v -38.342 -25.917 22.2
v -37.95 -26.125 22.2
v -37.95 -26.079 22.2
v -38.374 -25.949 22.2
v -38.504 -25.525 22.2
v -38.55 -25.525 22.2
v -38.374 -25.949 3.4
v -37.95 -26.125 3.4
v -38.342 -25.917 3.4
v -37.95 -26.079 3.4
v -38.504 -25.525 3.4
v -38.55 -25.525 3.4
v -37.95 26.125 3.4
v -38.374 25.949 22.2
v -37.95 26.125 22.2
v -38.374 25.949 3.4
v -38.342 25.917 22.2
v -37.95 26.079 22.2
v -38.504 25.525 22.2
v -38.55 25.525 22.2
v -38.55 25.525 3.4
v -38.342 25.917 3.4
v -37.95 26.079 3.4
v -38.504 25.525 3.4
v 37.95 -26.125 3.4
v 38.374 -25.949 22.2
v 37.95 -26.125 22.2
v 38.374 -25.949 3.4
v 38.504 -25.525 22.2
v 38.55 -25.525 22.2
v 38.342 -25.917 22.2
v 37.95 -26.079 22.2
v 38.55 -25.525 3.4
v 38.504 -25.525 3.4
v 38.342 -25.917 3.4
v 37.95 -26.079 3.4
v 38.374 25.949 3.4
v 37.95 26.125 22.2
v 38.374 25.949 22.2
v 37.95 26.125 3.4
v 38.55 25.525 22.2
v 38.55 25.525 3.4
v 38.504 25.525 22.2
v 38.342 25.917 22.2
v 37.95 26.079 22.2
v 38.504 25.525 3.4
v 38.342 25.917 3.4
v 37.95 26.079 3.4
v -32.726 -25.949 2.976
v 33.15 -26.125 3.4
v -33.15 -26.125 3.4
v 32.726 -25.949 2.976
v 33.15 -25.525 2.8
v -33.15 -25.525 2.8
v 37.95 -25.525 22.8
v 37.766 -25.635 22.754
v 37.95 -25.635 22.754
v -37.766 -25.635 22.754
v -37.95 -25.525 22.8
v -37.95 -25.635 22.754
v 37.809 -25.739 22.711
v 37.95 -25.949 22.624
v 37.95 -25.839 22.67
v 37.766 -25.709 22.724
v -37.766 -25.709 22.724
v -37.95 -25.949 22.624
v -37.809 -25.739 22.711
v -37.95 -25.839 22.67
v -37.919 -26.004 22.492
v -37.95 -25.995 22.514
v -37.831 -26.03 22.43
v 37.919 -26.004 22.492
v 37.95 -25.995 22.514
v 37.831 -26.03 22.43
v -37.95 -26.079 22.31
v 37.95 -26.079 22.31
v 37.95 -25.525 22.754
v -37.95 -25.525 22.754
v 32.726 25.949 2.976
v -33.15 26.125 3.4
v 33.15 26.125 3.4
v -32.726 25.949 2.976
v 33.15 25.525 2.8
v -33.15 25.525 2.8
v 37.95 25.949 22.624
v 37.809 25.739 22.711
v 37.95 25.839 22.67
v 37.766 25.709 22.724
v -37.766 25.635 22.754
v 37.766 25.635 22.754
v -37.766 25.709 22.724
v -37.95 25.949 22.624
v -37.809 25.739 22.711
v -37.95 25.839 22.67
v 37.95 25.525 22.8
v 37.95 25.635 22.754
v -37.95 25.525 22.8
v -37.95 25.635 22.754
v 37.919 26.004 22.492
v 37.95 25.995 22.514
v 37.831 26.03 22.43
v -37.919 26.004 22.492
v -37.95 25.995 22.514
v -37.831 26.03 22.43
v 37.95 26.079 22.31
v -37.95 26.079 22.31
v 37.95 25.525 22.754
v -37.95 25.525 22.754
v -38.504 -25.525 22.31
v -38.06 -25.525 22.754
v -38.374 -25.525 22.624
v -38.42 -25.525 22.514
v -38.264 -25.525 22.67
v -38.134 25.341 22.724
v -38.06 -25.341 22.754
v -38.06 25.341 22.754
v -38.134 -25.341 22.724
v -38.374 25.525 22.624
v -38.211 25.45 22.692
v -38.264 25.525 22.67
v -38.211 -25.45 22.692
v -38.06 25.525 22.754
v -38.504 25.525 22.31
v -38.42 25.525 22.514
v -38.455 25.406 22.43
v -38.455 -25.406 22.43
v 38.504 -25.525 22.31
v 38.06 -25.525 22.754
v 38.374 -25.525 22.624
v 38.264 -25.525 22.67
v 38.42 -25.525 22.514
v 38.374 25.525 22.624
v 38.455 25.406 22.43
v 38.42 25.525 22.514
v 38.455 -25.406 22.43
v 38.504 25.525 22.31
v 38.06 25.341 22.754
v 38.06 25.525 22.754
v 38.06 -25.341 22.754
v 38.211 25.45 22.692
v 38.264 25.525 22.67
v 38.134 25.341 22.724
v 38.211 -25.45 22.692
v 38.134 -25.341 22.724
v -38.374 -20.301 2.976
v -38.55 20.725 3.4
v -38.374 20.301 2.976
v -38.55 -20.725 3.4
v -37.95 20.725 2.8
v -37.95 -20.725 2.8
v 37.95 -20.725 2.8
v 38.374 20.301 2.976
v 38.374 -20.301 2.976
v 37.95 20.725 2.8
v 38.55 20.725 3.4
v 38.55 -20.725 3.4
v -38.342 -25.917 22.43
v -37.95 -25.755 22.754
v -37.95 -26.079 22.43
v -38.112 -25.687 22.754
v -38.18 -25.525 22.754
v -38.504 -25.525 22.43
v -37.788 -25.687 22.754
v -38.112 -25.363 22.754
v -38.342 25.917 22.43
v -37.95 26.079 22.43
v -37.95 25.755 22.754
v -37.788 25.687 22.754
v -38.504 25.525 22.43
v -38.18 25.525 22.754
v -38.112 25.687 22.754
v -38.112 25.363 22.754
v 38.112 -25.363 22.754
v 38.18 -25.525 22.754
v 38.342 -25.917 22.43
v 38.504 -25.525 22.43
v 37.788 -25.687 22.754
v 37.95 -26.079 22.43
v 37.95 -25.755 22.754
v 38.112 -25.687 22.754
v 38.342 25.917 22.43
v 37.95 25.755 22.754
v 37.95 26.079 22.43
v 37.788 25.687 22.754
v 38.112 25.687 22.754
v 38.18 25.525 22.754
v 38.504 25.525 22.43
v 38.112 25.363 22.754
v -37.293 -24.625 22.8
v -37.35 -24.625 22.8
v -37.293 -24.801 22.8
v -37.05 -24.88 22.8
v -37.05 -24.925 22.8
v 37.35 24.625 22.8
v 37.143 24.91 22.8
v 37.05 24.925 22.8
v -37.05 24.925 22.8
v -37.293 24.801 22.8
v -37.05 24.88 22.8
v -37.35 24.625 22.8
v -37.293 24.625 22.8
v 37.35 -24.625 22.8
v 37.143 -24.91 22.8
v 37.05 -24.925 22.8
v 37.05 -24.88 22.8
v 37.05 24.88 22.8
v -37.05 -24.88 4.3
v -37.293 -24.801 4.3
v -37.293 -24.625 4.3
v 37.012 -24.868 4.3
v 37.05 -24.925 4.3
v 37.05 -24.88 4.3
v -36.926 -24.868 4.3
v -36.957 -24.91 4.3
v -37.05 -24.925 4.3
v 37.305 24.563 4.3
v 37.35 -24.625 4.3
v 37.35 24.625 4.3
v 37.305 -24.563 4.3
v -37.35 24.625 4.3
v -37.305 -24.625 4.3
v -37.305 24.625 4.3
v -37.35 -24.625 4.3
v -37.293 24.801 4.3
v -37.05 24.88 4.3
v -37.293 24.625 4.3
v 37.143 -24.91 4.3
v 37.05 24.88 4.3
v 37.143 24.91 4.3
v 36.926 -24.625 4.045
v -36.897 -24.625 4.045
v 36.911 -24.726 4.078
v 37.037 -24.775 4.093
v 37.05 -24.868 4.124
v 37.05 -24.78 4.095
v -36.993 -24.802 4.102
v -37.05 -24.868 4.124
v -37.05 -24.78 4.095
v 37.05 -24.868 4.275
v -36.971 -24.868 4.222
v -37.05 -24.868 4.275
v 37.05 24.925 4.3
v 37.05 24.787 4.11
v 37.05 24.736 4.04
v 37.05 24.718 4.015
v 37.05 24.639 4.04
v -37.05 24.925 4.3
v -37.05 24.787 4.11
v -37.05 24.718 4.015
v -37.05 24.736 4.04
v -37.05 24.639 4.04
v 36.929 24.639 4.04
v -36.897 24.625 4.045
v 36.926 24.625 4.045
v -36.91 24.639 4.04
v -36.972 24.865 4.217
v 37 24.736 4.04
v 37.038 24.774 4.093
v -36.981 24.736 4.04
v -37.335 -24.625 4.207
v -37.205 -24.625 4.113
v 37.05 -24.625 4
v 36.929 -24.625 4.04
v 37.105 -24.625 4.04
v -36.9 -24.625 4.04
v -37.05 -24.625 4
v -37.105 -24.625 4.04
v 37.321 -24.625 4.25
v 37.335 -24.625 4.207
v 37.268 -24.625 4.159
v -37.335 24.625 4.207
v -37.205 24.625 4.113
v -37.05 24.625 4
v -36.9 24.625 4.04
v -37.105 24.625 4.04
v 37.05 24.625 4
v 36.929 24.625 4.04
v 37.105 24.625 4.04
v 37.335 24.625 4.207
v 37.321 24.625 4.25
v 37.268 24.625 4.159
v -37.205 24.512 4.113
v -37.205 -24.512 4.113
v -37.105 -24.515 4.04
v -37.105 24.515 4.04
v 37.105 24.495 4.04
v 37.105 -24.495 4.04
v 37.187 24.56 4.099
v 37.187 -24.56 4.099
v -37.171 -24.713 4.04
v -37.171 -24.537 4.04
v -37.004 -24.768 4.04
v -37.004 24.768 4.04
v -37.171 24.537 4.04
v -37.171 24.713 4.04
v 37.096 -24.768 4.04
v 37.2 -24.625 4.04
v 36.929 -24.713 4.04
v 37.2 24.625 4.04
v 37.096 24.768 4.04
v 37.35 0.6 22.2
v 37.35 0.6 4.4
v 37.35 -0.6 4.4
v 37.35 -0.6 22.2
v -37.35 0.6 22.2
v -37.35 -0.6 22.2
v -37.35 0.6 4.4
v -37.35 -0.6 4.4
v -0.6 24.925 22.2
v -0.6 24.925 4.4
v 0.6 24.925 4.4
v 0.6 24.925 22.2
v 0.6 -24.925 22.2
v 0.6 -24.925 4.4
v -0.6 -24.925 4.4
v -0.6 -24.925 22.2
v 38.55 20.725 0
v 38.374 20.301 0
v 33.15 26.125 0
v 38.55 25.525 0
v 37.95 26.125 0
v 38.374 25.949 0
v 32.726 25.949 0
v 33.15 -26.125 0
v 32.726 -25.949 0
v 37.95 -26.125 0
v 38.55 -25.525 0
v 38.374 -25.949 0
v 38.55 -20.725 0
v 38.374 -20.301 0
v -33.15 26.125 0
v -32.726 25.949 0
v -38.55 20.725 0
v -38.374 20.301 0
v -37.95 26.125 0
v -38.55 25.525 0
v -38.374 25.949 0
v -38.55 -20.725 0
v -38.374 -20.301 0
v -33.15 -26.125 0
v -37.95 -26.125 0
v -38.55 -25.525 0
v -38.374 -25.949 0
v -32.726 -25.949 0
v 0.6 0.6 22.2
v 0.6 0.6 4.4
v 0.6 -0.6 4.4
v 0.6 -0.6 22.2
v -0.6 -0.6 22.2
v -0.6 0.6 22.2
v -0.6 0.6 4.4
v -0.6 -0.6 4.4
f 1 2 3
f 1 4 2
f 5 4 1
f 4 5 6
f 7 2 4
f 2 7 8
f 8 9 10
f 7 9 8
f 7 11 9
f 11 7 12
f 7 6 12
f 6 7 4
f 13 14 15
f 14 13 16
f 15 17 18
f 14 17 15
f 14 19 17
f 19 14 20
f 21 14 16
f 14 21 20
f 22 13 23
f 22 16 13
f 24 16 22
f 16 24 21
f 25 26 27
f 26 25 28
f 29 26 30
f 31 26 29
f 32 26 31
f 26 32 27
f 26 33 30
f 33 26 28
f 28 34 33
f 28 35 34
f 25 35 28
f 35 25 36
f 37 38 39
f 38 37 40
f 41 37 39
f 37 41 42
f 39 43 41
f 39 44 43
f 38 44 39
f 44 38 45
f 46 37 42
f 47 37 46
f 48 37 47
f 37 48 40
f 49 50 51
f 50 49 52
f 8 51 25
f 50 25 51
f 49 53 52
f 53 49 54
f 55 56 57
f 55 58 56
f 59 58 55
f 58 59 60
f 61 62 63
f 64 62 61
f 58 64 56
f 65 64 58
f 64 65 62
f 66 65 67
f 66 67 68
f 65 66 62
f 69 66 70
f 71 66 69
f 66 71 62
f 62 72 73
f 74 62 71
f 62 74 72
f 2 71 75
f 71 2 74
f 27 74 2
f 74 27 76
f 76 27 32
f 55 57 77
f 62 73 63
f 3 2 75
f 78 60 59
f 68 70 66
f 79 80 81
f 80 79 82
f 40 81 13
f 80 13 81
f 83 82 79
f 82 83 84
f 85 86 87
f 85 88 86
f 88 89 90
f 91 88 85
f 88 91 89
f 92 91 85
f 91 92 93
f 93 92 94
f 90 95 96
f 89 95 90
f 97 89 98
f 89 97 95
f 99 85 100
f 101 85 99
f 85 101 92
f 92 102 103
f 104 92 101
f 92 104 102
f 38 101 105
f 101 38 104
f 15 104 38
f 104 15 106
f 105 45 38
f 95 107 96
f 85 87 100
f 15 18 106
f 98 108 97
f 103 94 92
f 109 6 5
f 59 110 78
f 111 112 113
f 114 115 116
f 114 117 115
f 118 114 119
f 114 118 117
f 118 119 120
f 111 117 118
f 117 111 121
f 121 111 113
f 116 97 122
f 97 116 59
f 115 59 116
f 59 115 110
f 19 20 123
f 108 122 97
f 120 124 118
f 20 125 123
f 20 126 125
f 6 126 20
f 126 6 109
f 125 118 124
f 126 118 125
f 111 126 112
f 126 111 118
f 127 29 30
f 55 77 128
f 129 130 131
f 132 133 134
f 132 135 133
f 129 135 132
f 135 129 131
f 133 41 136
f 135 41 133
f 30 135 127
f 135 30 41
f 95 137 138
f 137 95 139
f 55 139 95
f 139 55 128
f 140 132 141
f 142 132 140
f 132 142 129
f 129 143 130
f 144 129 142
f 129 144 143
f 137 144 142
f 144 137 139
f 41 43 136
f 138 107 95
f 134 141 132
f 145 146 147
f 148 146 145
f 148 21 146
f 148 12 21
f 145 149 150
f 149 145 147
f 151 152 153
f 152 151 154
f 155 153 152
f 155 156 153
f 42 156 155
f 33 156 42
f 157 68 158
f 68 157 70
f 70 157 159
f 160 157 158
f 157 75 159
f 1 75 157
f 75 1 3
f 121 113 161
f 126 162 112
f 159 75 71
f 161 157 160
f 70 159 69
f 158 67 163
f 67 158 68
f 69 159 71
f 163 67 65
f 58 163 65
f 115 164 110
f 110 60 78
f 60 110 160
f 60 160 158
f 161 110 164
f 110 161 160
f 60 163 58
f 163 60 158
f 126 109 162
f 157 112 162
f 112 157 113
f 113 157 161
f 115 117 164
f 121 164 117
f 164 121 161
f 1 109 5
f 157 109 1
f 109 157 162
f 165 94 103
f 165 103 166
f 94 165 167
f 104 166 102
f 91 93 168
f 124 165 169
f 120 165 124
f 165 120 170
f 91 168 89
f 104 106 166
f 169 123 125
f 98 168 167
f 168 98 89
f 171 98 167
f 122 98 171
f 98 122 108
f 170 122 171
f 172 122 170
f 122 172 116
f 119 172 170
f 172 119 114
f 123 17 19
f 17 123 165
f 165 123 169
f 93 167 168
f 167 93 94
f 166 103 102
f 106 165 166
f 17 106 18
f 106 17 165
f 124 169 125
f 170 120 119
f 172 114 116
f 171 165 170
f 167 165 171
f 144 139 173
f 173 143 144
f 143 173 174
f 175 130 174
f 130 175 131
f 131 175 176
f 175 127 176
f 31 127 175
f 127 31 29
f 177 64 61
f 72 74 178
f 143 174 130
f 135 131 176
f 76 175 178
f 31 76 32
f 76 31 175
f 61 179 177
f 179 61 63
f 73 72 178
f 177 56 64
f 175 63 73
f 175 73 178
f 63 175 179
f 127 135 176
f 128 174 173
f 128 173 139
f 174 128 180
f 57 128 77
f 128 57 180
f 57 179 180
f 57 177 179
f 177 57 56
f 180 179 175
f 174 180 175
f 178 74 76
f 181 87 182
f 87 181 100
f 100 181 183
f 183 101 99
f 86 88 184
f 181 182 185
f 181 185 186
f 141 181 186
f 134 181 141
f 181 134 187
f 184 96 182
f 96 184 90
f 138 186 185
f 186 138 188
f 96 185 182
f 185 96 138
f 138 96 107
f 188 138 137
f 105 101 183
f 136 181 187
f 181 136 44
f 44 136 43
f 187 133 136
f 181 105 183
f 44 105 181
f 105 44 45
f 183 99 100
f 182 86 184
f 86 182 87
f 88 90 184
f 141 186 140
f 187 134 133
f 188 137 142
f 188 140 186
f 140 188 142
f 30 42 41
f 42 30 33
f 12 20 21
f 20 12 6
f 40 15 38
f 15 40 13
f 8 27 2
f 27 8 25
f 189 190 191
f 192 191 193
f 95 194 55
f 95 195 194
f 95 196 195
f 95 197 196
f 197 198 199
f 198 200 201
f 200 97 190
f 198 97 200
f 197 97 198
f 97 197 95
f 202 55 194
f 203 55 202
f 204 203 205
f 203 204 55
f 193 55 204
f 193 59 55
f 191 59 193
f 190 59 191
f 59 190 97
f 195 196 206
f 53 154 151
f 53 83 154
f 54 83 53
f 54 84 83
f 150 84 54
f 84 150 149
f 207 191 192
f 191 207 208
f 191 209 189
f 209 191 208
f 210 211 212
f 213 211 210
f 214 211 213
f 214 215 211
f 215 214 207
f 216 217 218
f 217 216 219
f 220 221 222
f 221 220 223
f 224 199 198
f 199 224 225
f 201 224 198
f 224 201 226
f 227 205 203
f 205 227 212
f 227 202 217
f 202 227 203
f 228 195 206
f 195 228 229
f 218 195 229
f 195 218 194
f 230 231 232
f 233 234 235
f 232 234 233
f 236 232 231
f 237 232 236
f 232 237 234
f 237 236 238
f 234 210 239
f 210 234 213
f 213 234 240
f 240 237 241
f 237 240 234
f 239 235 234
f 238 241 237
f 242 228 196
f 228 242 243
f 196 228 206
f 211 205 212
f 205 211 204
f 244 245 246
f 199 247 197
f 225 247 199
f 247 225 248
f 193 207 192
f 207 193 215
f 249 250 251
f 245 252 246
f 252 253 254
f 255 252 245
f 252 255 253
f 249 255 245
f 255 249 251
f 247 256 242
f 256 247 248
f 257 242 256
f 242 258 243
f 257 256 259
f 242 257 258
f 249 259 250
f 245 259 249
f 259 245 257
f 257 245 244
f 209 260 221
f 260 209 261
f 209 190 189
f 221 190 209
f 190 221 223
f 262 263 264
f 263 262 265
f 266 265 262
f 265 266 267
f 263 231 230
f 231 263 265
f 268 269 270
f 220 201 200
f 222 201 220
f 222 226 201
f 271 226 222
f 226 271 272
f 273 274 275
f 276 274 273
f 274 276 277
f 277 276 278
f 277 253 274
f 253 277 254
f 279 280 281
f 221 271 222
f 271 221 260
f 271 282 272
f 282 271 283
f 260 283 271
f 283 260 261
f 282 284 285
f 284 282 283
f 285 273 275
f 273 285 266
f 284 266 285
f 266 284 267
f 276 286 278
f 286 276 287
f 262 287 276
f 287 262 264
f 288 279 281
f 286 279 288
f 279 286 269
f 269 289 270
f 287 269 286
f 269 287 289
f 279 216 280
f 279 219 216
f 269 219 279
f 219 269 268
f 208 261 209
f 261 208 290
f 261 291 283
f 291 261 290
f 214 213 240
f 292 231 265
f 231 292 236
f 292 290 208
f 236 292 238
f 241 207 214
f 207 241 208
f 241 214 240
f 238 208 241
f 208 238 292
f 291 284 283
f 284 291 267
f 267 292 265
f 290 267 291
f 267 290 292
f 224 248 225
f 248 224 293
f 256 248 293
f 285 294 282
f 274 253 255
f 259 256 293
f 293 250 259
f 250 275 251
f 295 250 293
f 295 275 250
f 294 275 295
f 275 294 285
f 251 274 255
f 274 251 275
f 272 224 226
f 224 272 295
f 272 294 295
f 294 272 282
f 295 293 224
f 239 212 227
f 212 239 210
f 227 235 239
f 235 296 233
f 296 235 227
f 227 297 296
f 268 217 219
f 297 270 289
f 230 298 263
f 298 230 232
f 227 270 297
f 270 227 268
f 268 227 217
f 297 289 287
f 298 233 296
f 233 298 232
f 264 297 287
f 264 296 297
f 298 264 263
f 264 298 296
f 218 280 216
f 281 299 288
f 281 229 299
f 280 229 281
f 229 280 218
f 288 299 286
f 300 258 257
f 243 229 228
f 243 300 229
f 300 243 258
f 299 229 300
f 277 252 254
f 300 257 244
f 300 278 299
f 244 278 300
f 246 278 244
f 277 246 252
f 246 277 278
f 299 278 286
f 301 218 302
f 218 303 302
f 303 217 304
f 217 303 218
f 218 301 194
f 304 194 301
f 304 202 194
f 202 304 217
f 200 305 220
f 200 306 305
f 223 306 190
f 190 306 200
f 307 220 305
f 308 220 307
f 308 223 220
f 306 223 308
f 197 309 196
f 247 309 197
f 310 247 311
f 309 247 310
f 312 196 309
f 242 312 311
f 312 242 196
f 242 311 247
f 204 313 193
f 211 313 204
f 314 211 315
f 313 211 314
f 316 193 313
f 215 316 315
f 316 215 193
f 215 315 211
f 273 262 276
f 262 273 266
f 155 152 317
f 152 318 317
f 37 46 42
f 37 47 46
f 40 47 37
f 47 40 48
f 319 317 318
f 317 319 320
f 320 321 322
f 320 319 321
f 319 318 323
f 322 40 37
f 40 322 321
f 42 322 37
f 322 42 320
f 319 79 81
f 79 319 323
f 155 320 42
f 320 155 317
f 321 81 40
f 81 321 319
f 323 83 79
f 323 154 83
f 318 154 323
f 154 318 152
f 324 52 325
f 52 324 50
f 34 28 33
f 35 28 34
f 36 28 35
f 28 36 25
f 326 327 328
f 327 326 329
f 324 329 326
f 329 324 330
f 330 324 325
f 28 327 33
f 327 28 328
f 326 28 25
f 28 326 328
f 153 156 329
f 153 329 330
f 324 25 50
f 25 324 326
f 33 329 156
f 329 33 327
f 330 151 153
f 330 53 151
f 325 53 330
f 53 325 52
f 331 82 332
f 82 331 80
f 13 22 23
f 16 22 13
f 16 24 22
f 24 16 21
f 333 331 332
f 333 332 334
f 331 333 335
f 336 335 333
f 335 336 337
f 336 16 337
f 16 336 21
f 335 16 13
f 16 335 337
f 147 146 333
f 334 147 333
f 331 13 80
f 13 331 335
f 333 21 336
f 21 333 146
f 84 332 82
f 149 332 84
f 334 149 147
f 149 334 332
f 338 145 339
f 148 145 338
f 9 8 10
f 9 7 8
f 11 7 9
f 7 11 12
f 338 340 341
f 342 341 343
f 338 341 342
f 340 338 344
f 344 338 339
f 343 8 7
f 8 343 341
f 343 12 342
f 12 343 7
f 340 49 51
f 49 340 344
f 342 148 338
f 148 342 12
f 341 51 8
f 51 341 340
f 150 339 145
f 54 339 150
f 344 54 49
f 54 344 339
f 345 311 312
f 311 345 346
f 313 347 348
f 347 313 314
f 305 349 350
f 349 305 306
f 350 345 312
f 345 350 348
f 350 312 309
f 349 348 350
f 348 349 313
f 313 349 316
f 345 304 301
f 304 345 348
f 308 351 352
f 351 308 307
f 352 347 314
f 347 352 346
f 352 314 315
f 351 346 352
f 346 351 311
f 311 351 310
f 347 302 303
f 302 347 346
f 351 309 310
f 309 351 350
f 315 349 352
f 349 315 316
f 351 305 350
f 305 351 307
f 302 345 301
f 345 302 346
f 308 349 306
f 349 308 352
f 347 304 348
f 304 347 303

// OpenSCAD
use <MCAD/boxes.scad>

/* [Main] */

// Number of vertical "slots" in the case.
lines = 1; // [1,2,3,4,5]

// Number of horizontal "slots" in the case.
columns = 2; // [1,2,3,4,5,6,7,8,9,10]

vertical_dividers = 1; // [0,1,2,3,4,5,6,7,8,9,10]
horizontal_dividers = 1; // [0,1,2,3,4,5,6,7,8,9,10]

case_height = 20; // [41:Shallow, 46.2:Deep]

/* [Optional] */

skirt_size = 0;  // [0:50]

wall_thickness = 1.2;

// Creates 2 separate pieces that can be printed without support but that have to be glued together.
split_base_and_top = "As One"; // [As One, Both, Base, Box]

/* [Hidden] */

$fa=0.5; // default minimum facet angle is now 0.5
$fs=0.5; // default minimum facet size is now 0.5 mm

split_parts_separation = 10;

single_box_width = 37.1;
single_box_height = 52.25;

double_box_width = 77.1;
double_box_height = 107.4;

round_radius = wall_thickness / 2;

feet_height = 2.8;
feet_size = 6;

feet_subtract = 0;//wall_thickness + 0.5;

// Correction due to Simplify3D bug
simplify_correction = 0.5;

spacing_width = (double_box_width - single_box_width * 2);
spacing_height = (double_box_height - single_box_height * 2);

final_width = (single_box_width * columns) + (spacing_width * (columns - 1));
final_height = (single_box_height * lines) + (spacing_height * (lines - 1));

internal_width = final_width - 2 * wall_thickness;
internal_height = final_height - 2 * wall_thickness;

vertical_spacing = (internal_width - (wall_thickness * vertical_dividers)) / (vertical_dividers + 1);
horizontal_spacing = (internal_height - (wall_thickness * horizontal_dividers)) / (horizontal_dividers + 1);

echo("W=", final_width, " H=", final_height, " vs=", vertical_spacing, " hs=", horizontal_spacing);

if (split_base_and_top == "As One") {
    box();
} else if (split_base_and_top == "Base") {
    split_base();
} else if (split_base_and_top == "Box") {
    split_box();
} else {
    if (final_width > final_height) {
        translate([0, final_height / 2 + split_parts_separation / 2, 0])
        split_box();

        translate([0, -final_height / 2 - split_parts_separation / 2, 0])
        split_base();
    } else {
        translate([0, final_width / 2 + split_parts_separation / 2, 0])
        rotate([0, 0, 90])
        split_box();

        translate([0, -final_width / 2 - split_parts_separation / 2, 0])
        rotate([0, 0, 90])
        split_base();
    }
}

module split_base() {
    rotate([0, 180, 0])
    translate([0, 0, -feet_height - round_radius])
    difference() {
        box();
        translate([0, 0, feet_height + case_height / 2 + 1 + round_radius]) cube([final_width + 2, final_height + 2, case_height + 2], center = true);
    }
}

module split_box() {
    translate([0, 0, - feet_height - round_radius])
    difference() {
        box();
        translate([0, 0, - case_height/2 - 1 + feet_height + round_radius]) cube([final_width + 2, final_height + 2, case_height + 2], center = true);
    }
}

module feet() {
	translate([0,0,-(feet_height-round_radius)/2])
	difference() {
		union() {
			difference() {
				roundedBox([feet_size, feet_size, feet_height + round_radius], round_radius, sidesonly = true);
				rotate([0,0,45]) translate([-feet_size, 0, -feet_height]) cube([feet_size*2, feet_size, feet_height + 4]);
			}
		
			if (skirt_size > 0) {
				translate([0,0,-(feet_height + round_radius)/2]) cylinder(r = skirt_size, h = 0.3, center = false);
			}
		}
		if (skirt_size > 0) {
			translate([-skirt_size-1,0,-(feet_height + round_radius)/2-0.5]) cube([skirt_size+1, skirt_size+1, 1]);
		}
	}
}
module box() {
    translate([0, 0, case_height / 2 + feet_height])
    union() {
        difference() {
            roundedBox([final_width, final_height, case_height], round_radius);
            translate([0,0,wall_thickness]) roundedBox([final_width - 2 * wall_thickness, final_height - 2 * wall_thickness, case_height], round_radius/2);
        }
        
        if (vertical_dividers > 0) {
            translate([-(internal_width - wall_thickness) / 2,0,0])
            for (i = [1:vertical_dividers]) {
                translate([vertical_spacing*i+wall_thickness * (i-1),0,simplify_correction]) cube([wall_thickness, internal_height, case_height-wall_thickness-simplify_correction*2], center = true);
            }
        }
        
        if (horizontal_dividers > 0) {
            translate([0,-(internal_height - wall_thickness) / 2,0])
            for (i = [1:horizontal_dividers]) {
                translate([0,horizontal_spacing*i+wall_thickness * (i-1),simplify_correction]) cube([internal_width, wall_thickness, case_height-wall_thickness-simplify_correction*2], center = true);
            }
        }
        
        for (x=[1, -1]) {
            for (y=[1, -1]) {
                translate([x * (final_width - feet_size) / 2 - x * feet_subtract, y * (final_height - feet_size) / 2 - y * feet_subtract, -case_height / 2]) rotate([0,0, (x==1 && y ==1 ? 90 : (x == -1 && y == 1 ? 180 : (x == -1 && y == -1 ? 270 : 0)))]) feet();
            }
        }	
    }
}
